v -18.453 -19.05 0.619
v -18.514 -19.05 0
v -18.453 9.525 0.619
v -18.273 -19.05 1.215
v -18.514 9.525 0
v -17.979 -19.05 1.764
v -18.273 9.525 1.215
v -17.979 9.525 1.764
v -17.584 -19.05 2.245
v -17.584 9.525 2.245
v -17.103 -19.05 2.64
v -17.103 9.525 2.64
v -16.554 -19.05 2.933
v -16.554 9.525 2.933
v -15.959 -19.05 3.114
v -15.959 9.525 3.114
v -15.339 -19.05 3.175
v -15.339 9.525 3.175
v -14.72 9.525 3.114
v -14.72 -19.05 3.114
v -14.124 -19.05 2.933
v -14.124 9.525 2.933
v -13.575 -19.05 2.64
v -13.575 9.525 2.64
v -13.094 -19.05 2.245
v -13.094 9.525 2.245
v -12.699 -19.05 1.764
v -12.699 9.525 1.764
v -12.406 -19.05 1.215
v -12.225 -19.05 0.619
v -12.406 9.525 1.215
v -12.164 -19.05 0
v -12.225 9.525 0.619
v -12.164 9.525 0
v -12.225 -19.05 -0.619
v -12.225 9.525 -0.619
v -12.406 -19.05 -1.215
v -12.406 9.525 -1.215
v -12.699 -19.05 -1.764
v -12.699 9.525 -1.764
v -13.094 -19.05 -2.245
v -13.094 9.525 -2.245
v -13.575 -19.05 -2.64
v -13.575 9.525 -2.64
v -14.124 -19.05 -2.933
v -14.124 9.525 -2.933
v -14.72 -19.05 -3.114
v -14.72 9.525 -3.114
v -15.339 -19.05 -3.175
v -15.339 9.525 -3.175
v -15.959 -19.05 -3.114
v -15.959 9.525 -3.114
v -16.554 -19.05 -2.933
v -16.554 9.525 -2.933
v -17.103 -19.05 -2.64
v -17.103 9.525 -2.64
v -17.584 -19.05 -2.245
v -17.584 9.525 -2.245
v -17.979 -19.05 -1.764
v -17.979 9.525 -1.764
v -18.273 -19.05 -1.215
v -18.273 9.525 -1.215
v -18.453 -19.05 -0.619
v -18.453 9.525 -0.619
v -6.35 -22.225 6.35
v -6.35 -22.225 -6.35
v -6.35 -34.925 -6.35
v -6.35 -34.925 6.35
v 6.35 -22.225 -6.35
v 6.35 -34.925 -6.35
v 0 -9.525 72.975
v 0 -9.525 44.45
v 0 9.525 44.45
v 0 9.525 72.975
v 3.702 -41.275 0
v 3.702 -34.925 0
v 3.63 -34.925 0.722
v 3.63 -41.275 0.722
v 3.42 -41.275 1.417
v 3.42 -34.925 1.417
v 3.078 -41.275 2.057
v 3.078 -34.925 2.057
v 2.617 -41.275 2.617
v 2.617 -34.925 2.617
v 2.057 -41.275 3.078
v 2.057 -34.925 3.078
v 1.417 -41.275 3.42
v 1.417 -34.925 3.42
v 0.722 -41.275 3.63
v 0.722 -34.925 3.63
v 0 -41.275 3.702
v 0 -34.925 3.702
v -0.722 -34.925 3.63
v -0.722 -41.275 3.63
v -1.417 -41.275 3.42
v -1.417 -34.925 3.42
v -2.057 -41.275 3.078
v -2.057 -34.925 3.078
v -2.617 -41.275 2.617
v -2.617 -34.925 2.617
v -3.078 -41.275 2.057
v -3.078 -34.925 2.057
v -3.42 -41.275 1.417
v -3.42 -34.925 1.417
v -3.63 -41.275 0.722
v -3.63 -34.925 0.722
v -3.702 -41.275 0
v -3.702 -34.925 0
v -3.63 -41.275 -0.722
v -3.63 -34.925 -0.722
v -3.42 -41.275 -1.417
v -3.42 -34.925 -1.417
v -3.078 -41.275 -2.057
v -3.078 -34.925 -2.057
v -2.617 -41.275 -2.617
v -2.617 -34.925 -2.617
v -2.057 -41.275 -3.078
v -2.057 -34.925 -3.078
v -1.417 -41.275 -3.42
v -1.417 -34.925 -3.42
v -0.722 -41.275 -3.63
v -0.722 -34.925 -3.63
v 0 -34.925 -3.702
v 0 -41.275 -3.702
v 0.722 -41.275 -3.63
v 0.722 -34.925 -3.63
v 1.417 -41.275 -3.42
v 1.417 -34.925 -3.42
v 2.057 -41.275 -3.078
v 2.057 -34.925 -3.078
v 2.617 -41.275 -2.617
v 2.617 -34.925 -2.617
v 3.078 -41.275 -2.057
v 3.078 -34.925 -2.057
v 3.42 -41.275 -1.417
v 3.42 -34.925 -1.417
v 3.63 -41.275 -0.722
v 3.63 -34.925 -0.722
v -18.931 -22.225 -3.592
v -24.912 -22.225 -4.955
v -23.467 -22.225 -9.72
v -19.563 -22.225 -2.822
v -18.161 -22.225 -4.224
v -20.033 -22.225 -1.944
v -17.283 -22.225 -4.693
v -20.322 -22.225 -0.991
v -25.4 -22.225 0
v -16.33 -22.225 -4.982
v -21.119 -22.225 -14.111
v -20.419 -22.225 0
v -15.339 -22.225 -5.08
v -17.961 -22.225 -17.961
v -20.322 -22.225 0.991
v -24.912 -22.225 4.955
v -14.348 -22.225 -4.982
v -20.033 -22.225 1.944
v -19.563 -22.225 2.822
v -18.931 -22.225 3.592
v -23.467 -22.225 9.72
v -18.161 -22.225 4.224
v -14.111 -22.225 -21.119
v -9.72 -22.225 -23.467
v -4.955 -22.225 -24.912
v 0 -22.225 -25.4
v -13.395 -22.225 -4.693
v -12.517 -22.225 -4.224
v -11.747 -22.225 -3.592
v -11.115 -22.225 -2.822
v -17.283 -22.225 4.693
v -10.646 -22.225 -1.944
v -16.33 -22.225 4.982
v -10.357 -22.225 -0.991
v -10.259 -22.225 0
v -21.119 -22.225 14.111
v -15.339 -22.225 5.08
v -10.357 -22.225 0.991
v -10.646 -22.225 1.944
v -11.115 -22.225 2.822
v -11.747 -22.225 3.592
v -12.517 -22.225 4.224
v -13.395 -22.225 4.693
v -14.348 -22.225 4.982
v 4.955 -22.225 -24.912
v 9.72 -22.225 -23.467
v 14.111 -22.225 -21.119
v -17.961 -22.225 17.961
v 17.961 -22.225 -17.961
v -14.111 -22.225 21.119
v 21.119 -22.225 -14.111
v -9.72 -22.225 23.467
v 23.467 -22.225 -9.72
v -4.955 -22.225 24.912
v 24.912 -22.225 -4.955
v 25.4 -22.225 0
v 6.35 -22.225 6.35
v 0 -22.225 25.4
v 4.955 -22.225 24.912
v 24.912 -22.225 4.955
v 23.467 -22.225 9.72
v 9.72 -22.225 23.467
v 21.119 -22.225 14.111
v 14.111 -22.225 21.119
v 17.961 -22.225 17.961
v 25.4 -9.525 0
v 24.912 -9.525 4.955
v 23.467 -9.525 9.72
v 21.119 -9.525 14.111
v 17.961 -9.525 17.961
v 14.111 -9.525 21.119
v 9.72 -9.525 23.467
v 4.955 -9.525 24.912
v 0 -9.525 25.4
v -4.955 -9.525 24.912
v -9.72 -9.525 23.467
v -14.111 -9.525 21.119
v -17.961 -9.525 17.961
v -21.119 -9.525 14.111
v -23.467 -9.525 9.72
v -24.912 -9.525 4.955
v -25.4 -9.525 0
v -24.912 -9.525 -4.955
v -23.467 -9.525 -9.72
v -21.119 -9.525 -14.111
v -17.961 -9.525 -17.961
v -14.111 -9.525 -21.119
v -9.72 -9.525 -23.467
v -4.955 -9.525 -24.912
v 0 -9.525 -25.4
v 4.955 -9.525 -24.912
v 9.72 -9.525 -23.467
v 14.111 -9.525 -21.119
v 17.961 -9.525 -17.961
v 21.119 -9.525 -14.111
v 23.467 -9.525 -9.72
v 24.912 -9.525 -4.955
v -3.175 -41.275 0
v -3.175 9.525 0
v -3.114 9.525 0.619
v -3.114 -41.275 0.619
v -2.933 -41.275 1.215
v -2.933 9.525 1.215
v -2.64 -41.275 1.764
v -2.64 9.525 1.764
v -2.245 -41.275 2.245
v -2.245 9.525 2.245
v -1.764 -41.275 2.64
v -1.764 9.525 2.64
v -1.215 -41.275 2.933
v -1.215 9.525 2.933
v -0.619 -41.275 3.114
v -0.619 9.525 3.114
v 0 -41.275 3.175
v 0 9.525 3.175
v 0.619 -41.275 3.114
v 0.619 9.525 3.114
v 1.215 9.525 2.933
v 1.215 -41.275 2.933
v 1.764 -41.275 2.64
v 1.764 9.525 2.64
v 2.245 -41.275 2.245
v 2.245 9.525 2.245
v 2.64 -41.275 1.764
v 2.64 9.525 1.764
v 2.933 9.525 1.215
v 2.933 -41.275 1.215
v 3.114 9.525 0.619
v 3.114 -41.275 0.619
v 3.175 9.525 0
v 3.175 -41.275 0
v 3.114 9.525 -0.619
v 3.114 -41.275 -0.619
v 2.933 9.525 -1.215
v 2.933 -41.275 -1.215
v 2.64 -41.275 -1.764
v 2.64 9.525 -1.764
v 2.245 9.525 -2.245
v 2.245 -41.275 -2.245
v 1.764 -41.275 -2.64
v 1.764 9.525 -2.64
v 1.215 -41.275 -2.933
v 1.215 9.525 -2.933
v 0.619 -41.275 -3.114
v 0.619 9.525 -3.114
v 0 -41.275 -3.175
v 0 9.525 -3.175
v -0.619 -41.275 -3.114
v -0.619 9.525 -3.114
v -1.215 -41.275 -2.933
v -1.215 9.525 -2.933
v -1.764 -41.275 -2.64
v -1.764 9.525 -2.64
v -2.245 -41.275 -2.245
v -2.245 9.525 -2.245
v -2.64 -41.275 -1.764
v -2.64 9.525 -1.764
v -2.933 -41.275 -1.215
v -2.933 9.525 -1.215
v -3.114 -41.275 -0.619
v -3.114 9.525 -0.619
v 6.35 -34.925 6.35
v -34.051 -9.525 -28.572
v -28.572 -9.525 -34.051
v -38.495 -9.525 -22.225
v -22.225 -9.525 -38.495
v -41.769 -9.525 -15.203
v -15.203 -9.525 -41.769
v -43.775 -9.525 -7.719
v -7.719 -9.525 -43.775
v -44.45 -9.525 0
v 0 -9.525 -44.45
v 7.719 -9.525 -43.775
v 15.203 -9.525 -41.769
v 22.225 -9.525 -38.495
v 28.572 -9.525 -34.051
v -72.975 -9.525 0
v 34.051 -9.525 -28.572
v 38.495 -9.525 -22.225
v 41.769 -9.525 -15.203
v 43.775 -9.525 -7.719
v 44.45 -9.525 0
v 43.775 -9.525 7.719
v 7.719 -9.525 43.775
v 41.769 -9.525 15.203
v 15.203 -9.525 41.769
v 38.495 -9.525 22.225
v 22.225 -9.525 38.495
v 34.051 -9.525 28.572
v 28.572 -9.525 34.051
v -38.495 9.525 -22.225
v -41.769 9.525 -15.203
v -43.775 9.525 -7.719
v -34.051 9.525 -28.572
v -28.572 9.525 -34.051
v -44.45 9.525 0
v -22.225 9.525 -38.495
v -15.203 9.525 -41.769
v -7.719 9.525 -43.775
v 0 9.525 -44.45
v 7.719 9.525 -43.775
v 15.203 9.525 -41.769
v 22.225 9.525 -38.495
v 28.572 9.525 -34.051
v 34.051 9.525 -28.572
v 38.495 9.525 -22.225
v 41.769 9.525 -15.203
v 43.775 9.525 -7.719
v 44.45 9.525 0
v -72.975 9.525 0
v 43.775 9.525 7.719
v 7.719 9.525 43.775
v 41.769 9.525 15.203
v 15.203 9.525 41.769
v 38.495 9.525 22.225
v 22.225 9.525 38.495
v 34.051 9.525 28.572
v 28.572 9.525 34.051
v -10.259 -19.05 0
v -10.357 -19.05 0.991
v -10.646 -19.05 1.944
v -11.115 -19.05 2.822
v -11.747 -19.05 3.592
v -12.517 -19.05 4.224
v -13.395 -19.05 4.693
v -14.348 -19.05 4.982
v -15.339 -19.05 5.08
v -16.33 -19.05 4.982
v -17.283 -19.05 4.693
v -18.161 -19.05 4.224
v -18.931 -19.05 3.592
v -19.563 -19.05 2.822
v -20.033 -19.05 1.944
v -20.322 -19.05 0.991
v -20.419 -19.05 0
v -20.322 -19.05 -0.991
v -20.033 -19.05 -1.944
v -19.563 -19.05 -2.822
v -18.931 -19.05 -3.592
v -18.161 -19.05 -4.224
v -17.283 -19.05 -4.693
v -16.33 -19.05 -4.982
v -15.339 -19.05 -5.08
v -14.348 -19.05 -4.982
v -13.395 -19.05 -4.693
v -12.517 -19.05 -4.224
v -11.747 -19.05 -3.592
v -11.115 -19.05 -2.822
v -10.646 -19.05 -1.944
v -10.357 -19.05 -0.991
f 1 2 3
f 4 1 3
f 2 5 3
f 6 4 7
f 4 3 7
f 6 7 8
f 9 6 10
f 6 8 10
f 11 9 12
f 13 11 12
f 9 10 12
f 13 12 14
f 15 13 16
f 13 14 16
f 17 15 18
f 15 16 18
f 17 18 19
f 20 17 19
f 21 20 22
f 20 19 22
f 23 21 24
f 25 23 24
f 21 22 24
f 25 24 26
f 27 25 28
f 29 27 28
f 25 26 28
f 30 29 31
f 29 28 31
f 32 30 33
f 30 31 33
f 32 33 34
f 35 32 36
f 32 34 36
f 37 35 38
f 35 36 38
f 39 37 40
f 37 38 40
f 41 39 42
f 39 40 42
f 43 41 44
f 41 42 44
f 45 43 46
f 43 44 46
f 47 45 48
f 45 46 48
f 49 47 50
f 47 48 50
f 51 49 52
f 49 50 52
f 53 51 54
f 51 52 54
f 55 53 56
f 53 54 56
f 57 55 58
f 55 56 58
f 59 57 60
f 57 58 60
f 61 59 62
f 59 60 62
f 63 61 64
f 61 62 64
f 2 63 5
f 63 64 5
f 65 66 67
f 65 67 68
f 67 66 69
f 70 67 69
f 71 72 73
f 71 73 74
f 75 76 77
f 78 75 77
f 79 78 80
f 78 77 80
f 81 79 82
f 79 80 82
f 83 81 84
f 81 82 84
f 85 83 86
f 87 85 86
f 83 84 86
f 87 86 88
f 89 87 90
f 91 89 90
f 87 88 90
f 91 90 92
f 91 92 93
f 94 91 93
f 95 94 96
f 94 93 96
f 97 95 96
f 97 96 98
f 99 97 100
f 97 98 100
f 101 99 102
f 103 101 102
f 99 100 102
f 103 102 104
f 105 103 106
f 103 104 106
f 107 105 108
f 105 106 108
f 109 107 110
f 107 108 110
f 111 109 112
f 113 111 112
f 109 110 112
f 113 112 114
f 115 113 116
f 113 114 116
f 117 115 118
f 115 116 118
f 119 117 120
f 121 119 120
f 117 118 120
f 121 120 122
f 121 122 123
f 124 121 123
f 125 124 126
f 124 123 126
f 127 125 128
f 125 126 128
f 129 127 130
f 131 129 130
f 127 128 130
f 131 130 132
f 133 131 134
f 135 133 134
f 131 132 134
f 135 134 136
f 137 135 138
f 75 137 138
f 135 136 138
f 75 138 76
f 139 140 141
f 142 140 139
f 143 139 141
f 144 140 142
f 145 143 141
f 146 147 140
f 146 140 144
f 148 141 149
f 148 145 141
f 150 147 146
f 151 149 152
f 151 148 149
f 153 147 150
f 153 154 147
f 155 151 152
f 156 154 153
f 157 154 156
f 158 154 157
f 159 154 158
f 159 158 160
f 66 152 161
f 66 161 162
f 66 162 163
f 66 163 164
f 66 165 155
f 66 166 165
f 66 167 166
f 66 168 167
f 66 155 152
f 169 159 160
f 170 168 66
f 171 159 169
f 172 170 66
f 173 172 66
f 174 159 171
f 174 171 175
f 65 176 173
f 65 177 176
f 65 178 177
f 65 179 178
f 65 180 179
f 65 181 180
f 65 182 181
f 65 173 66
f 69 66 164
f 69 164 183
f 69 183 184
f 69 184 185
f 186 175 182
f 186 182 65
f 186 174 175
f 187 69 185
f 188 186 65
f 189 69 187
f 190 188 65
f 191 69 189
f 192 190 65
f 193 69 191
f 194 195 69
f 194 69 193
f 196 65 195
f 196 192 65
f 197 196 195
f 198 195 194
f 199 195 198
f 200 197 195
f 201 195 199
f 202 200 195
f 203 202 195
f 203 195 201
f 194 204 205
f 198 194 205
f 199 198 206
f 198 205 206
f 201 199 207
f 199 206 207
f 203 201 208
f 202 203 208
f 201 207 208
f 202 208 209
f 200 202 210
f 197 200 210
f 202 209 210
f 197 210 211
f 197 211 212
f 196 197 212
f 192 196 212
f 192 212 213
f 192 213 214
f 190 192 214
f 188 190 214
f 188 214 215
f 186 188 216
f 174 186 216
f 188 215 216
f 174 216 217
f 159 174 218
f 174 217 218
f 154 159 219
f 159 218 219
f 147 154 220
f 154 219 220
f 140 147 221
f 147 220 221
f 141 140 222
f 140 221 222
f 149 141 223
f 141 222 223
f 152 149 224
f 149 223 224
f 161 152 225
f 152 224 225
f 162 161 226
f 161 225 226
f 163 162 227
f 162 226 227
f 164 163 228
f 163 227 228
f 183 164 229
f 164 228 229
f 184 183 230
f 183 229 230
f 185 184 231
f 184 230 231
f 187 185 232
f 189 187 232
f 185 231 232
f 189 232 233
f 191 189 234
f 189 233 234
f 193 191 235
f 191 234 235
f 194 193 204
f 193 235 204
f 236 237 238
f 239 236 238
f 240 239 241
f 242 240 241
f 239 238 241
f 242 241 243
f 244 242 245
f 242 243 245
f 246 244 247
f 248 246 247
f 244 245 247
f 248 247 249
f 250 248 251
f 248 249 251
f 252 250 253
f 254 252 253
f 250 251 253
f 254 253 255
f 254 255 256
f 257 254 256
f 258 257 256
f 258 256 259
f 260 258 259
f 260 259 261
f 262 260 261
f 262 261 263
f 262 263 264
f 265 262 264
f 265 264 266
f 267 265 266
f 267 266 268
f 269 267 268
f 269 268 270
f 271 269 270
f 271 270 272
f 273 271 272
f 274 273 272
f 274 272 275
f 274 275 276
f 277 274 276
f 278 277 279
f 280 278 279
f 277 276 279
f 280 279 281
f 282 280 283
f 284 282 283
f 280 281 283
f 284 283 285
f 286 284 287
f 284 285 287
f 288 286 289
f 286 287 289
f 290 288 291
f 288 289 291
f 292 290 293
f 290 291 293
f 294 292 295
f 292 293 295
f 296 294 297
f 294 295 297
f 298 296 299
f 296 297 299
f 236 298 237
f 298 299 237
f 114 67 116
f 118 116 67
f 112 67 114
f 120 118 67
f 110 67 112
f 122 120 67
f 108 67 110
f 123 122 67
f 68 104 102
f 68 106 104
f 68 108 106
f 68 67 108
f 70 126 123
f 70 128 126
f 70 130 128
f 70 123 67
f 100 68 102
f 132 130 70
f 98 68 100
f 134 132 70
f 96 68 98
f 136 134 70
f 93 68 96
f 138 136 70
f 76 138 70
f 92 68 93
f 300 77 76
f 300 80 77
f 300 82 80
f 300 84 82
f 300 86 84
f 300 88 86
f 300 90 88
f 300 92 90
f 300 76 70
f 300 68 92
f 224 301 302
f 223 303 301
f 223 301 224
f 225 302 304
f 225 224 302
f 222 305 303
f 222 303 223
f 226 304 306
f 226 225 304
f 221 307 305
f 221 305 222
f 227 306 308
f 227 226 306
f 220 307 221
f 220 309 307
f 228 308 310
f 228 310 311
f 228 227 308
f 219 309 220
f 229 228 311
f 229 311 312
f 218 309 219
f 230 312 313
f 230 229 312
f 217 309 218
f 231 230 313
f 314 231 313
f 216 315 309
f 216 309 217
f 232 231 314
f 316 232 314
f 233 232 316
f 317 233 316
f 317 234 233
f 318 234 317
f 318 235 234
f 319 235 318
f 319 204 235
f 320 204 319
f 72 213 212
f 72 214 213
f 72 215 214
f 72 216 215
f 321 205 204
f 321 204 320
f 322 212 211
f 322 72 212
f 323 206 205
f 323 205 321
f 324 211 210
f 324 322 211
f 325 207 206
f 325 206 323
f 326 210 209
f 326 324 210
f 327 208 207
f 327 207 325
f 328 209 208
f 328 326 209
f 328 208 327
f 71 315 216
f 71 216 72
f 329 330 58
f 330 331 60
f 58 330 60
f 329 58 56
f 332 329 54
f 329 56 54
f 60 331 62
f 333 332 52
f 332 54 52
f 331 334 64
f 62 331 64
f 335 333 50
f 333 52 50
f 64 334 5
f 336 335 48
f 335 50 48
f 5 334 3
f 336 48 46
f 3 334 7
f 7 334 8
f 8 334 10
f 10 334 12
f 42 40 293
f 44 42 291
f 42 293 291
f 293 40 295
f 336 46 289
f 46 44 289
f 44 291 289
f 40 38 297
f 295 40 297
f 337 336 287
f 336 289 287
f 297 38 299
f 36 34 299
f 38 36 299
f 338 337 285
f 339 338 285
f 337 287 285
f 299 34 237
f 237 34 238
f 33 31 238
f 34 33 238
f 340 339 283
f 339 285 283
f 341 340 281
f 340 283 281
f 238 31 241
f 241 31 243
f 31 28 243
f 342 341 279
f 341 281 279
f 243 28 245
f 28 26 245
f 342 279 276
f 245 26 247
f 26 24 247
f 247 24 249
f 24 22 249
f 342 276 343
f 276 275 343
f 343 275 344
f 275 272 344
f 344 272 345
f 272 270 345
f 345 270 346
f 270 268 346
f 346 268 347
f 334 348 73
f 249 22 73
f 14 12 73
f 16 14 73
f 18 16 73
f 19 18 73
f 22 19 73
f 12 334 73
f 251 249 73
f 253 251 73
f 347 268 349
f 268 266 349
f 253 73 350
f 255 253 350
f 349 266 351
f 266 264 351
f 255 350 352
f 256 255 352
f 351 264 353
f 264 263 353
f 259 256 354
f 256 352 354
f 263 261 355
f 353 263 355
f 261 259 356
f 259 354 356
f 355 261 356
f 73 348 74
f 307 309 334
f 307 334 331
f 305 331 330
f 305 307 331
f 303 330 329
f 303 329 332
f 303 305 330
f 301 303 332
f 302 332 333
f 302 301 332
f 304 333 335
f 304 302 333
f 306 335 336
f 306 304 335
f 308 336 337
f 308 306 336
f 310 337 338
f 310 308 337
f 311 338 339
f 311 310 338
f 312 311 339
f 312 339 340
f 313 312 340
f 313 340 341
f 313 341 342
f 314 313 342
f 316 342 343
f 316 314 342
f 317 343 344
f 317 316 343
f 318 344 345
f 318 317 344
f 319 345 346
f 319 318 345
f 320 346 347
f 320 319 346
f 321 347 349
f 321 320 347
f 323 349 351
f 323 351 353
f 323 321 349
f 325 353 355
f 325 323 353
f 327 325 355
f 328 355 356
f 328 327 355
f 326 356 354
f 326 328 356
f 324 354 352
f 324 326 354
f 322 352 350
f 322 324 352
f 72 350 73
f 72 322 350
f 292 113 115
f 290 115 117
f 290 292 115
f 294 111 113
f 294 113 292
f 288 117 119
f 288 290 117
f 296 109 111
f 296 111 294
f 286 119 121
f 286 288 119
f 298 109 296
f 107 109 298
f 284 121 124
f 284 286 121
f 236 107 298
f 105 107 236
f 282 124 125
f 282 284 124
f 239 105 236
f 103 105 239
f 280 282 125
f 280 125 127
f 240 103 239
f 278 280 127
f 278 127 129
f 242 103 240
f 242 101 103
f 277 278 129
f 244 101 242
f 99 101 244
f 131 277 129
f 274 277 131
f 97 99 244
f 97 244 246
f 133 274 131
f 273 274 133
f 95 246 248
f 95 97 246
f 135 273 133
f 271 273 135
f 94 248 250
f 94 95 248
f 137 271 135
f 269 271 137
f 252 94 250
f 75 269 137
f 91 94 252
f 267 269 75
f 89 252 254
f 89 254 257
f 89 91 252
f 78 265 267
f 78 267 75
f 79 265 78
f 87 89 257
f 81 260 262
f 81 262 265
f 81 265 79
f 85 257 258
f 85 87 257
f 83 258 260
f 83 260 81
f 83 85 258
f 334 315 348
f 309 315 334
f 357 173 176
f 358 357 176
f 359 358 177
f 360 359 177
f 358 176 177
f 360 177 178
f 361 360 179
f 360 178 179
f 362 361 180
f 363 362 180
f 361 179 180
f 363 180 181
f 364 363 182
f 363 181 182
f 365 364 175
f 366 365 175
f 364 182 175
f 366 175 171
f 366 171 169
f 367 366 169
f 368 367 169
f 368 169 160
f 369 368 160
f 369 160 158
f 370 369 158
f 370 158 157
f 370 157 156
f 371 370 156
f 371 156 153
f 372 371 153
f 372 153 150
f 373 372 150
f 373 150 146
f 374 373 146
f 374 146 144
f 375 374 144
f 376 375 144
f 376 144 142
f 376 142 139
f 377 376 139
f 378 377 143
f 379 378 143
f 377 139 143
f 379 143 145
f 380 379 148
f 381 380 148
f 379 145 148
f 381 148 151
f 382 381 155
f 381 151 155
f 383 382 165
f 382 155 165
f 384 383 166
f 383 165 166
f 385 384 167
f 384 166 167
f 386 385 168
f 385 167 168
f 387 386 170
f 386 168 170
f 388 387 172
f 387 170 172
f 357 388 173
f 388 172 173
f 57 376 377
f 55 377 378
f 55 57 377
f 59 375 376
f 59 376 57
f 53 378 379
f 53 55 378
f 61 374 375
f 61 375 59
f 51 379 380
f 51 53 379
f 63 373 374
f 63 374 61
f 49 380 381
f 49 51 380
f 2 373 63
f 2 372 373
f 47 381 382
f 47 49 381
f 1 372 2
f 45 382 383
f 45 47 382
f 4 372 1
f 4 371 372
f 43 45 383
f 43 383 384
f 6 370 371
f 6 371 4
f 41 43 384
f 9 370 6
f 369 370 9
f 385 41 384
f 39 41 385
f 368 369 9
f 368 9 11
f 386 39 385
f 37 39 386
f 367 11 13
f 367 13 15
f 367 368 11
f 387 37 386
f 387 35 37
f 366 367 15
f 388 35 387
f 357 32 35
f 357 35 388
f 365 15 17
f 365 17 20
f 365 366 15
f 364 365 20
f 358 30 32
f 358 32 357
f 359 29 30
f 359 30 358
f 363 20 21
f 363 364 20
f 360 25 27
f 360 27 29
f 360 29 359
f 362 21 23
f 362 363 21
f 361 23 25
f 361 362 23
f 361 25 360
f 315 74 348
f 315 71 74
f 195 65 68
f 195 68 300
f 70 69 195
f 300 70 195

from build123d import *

# Parameters (mm, degrees)
F1_DEPTH        = 9.525
F2_R            = 25.4
F3_DEPTH        = 12.7
F4_W            = 12.7
F4_H            = 12.7
F5_DEPTH        = 12.7
F6_R            = 3.701609
F7_DEPTH        = 6.35
F9_D            = 6.35
F11_D           = 6.35
F11_CBORE_D     = 10.16
F11_CBORE_DEPTH = 3.175


with BuildPart() as f1:
    # F0 (on Front) → F1 (new body, symmetric)
    with BuildSketch(Plane.XZ):
        with BuildLine():
            Line((-72.97454, 0), (-44.45, 0))
            ThreePointArc((-44.45, 0), (31.430896, -31.430896), (0, 44.45))
            Line((0, 44.45), (0, 72.97454))
            Line((0, 72.97454), (-72.97454, 0))
        make_face()
    extrude(amount=F1_DEPTH, both=True)

    # F2 (on face) → F3 (join)
    with BuildSketch(Plane.XZ.offset(9.525)):
        Circle(F2_R)
    extrude(amount=F3_DEPTH)

    # F4 (on face) → F5 (join)
    with BuildSketch(Plane.XZ.offset(22.225)):
        Rectangle(F4_W, F4_H)
    extrude(amount=F5_DEPTH)

    # F6 (on face) → F7 (join)
    with BuildSketch(Plane.XZ.offset(34.925)):
        Circle(F6_R)
    extrude(amount=F7_DEPTH)

    # F9 (through all)
    with Locations(Plane.XZ.offset(41.275)):
        with Locations((0, 0)):
            Hole(F9_D / 2)

    # F11 (through all)
    with Locations(Plane.XZ.offset(22.225)):
        with Locations((-15.339203, 0)):
            CounterBoreHole(F11_D / 2, F11_CBORE_D / 2, F11_CBORE_DEPTH)


solid = f1.part
